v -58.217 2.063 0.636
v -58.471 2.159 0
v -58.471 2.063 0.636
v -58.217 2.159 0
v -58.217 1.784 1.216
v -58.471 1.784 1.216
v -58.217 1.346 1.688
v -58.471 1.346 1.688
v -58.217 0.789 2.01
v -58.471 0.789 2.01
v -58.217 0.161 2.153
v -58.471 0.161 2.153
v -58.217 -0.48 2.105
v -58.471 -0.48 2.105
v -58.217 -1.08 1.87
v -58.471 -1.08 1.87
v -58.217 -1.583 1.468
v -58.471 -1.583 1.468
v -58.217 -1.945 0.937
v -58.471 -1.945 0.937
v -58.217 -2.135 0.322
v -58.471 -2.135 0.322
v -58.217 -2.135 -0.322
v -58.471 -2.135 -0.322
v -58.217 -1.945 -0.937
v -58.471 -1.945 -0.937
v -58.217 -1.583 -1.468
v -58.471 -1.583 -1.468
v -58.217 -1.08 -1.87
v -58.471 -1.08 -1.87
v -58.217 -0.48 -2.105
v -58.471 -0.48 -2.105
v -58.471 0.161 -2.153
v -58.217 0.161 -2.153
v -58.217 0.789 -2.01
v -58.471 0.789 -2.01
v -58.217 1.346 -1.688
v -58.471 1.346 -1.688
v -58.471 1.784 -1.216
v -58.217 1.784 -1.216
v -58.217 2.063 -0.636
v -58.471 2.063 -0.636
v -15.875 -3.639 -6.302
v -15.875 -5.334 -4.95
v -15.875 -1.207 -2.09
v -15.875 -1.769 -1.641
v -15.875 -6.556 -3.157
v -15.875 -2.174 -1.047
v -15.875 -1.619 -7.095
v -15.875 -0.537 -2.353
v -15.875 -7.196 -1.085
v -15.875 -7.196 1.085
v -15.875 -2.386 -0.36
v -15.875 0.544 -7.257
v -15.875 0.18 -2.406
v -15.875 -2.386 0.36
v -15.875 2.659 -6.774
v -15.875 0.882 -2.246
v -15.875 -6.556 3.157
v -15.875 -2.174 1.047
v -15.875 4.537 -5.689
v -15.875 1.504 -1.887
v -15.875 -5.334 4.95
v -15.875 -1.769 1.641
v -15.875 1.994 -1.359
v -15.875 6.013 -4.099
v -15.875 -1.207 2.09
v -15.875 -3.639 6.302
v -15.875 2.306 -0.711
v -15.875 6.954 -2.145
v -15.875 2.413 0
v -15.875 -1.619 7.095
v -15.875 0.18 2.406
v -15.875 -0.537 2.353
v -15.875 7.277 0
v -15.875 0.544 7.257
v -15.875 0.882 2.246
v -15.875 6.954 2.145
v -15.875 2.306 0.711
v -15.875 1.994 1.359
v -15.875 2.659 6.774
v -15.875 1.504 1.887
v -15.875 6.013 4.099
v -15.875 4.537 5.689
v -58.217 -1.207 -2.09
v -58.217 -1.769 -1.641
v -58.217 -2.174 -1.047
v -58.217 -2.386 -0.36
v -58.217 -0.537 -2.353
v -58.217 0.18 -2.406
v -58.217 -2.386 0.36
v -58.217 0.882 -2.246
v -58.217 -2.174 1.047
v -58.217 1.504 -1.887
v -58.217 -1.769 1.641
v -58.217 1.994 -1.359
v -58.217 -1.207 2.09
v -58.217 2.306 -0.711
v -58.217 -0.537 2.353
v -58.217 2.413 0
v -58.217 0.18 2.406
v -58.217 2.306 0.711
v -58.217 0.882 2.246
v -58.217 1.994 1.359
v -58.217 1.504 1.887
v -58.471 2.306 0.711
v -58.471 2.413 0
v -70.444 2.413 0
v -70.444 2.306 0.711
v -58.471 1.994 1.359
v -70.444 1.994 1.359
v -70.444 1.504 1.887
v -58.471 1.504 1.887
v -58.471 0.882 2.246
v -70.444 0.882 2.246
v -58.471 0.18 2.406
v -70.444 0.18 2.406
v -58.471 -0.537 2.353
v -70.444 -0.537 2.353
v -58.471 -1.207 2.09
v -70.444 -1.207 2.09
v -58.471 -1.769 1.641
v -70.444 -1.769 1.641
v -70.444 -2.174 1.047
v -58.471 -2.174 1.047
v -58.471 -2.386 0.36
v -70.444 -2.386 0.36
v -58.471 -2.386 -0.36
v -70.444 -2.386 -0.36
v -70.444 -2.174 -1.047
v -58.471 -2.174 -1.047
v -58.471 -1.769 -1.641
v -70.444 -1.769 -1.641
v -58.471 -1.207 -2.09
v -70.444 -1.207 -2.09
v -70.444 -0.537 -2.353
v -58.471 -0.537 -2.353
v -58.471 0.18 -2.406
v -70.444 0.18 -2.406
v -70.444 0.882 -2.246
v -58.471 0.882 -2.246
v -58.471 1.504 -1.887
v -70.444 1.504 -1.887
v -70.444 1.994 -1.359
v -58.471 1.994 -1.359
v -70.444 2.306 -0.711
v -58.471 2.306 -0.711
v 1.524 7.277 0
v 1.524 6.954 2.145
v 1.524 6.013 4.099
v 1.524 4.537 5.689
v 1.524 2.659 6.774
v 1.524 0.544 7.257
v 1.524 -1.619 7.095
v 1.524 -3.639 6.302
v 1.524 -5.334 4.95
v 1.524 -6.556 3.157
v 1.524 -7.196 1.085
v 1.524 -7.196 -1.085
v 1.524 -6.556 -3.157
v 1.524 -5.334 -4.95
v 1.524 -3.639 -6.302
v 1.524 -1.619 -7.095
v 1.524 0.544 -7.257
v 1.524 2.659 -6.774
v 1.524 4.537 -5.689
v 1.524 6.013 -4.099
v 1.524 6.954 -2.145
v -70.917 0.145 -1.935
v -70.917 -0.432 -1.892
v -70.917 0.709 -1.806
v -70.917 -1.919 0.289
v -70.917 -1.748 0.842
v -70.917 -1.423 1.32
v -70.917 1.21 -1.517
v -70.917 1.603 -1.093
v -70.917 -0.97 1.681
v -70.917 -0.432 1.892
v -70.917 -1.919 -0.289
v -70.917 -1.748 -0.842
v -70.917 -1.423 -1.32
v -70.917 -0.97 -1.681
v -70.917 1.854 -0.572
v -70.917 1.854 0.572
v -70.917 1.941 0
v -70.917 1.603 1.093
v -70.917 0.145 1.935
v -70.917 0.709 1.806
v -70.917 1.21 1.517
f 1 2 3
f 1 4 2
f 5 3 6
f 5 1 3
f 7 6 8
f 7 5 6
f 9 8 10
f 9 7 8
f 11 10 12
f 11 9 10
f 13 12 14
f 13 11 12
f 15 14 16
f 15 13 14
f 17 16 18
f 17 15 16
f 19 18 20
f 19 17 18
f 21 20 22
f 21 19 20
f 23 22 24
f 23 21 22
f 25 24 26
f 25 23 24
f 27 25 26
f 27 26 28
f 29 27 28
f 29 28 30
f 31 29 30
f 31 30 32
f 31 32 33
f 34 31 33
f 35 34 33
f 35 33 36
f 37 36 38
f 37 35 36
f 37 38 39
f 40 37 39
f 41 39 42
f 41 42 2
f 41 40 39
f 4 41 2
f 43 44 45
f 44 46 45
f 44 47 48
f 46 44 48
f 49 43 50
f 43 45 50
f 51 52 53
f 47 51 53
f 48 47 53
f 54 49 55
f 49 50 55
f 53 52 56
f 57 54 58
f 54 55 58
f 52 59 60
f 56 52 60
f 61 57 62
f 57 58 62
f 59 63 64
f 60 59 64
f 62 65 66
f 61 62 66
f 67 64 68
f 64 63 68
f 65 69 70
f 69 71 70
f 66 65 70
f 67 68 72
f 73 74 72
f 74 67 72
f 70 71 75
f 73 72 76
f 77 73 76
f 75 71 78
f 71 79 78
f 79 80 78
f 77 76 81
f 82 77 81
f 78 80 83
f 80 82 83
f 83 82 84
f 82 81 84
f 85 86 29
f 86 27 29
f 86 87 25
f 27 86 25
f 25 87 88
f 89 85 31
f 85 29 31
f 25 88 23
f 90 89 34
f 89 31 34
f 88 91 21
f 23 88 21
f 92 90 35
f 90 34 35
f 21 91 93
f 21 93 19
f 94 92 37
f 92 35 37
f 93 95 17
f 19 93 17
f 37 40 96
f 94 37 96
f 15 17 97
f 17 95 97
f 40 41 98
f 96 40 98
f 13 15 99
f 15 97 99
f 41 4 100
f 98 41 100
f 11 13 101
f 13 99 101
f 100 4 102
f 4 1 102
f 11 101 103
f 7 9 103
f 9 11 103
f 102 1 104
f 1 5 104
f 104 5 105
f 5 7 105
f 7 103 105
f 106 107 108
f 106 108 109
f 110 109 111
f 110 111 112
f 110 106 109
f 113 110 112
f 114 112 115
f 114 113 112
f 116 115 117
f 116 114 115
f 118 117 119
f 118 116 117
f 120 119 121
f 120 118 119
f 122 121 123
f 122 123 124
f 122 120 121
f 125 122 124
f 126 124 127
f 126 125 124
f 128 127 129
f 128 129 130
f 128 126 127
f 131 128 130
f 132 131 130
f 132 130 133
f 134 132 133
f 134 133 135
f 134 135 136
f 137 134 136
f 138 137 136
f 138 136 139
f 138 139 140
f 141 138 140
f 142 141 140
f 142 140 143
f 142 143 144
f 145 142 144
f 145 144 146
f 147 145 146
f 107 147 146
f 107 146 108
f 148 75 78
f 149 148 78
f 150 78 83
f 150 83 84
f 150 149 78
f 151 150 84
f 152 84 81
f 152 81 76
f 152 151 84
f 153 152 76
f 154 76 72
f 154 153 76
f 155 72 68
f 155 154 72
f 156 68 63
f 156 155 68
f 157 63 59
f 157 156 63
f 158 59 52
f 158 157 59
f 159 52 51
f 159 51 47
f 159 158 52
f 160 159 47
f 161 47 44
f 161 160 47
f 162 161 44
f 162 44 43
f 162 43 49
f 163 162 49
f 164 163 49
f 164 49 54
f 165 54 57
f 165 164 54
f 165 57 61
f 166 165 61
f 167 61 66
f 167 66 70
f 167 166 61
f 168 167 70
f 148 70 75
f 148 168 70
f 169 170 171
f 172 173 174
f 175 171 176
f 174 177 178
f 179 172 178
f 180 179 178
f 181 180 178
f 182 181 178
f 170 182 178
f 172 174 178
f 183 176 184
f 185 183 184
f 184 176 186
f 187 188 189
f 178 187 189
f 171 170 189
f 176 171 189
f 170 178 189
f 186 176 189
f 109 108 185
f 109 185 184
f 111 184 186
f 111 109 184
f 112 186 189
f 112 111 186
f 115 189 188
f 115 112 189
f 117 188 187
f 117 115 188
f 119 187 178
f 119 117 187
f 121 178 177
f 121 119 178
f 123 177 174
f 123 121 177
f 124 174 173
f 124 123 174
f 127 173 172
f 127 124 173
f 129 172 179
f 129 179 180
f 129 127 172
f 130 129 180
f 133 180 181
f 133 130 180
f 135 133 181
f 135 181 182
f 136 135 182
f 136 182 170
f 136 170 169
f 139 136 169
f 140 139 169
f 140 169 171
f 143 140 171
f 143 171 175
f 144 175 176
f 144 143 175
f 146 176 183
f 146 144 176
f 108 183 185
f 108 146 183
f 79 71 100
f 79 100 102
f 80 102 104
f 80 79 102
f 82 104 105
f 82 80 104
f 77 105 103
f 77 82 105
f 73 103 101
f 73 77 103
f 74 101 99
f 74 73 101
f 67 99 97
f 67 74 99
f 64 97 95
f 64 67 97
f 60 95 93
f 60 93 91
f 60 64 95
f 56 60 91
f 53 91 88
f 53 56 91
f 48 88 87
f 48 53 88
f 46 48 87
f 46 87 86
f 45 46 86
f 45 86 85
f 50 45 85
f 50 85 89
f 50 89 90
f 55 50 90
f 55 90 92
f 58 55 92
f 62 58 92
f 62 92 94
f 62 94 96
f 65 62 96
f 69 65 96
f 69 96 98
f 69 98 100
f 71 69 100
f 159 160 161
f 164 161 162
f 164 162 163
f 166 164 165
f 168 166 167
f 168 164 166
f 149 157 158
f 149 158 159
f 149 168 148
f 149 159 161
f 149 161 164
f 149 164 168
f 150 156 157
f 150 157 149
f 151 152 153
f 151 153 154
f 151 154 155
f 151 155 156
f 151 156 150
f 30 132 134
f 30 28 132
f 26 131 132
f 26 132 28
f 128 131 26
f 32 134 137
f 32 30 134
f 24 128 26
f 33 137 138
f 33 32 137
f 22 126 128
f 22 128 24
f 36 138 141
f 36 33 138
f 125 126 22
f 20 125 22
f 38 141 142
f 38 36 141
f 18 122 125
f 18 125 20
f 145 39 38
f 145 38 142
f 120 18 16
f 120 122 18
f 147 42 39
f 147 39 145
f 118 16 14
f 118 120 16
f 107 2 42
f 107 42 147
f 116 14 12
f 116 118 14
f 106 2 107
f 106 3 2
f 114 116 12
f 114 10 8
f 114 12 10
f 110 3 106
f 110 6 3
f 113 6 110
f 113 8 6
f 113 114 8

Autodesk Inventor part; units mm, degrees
sketch "Sketch_3" plane through (0, 0, 0) normal (0, 0, 1) x (1, 0, 0)
  line L0 (0, 0) -> (-70.9168, 0)
  line L1 (-70.9168, 0) -> (-70.9168, 1.9406)
  line L2 (-70.9168, 1.9406) -> (-70.4444, 2.413)
  line L3 (-70.4444, 2.413) -> (0, 2.413)
  line L4 (0, 2.413) -> (0, 0)
  line L5 (0, 0) -> (-70.9168, 0)
revolve "Revolution1" add sketch "Sketch_3" angle 360 about axis through (0, 0, 0) along (1, 0, 0)
thread "Thread1" size "10-32 UNF" class "2A" standard "ANSI Unified Screw Threads" length 12.446 offset 58.4708
sketch "Sketch_17" plane through (0, 0, 0) normal (0, 0, 1) x (1, 0, 0)
  line L0 (70.9168, 0) -> (-70.9168, 0)
  line L1 (-58.4708, 2.413) -> (-58.4708, 2.159)
  line L2 (-58.4708, 2.159) -> (-58.2168, 2.159)
  line L3 (-58.2168, 2.159) -> (-58.2168, 2.413)
  line L4 (-58.2168, 2.413) -> (-58.4708, 2.413)
revolve "Revolution2" cut sketch "Sketch_17" angle 360 about axis through (70.9168, 0, 0) along (1, 0, 0)
sketch "Sketch_12" plane through (0, 0, 0) normal (0, 0, 1) x (1, 0, 0)
  line L0 (1.524, 0) -> (-15.875, 0)
  line L1 (-15.875, 0) -> (-15.875, 7.2771)
  line L2 (-15.875, 7.2771) -> (1.524, 7.2771)
  line L3 (1.524, 7.2771) -> (1.524, 0)
  line L4 (1.524, 0) -> (-15.875, 0)
revolve "Revolution3" add sketch "Sketch_12" angle 360 about axis through (1.524, 0, 0) along (1, 0, 0)
ref_plane "h1_XY" through (-70.9168, 0, 0) normal (0, 1, 0) x (1, 0, 0)
ref_plane "h1_YZ" through (-70.9168, 0, 0) normal (1, 0, 0) x (0, 0, -1)
ref_plane "h1_ZX" through (-70.9168, 0, 0) normal (0, 0, -1) x (0, 1, 0)
ref_plane "h2_XY" through (-58.2168, 0, 0) normal (0, 1, 0) x (1, 0, 0)
ref_plane "h2_YZ" through (-58.2168, 0, 0) normal (1, 0, 0) x (0, 0, -1)
ref_plane "h2_ZX" through (-58.2168, 0, 0) normal (0, 0, -1) x (0, 1, 0)
ref_plane "k1_XY" through (-70.9168, 0, -2.413) normal (0, 1, 0) x (1, 0, 0)
ref_plane "k1_YZ" through (-70.9168, 0, -2.413) normal (1, 0, 0) x (0, 0, -1)
ref_plane "k1_ZX" through (-70.9168, 0, -2.413) normal (0, 0, -1) x (0, 1, 0)
ref_plane "k2_XY" through (-70.9168, 0, 2.413) normal (0, 1, 0) x (1, 0, 0)
ref_plane "k2_YZ" through (-70.9168, 0, 2.413) normal (1, 0, 0) x (0, 0, -1)
ref_plane "k2_ZX" through (-70.9168, 0, 2.413) normal (0, 0, -1) x (0, 1, 0)
ref_plane "start_XY" through (-58.2168, 0, 0) normal (0, 1, 0) x (1, 0, 0)
ref_plane "start_YZ" through (-58.2168, 0, 0) normal (1, 0, 0) x (0, 0, -1)
ref_plane "start_ZX" through (-58.2168, 0, 0) normal (0, 0, -1) x (0, 1, 0)
ref_plane "to_prc_XY" through (-58.2168, 0, 0) normal (1, 0, 0) x (0, 0, -1)
ref_plane "to_prc_YZ" through (-58.2168, 0, 0) normal (0, 0, -1) x (0, 1, 0)
ref_plane "to_prc_ZX" through (-58.2168, 0, 0) normal (0, 1, 0) x (1, 0, 0)
ref_plane "to_rod_guide_XY" through (-70.9168, 0, 0) normal (1, 0, 0) x (0, 0, -1)
ref_plane "to_rod_guide_YZ" through (-70.9168, 0, 0) normal (0, 0, -1) x (0, 1, 0)
ref_plane "to_rod_guide_ZX" through (-70.9168, 0, 0) normal (0, 1, 0) x (1, 0, 0)
properties part number "D-75080.5-0.011XP-2.792-3pos"
